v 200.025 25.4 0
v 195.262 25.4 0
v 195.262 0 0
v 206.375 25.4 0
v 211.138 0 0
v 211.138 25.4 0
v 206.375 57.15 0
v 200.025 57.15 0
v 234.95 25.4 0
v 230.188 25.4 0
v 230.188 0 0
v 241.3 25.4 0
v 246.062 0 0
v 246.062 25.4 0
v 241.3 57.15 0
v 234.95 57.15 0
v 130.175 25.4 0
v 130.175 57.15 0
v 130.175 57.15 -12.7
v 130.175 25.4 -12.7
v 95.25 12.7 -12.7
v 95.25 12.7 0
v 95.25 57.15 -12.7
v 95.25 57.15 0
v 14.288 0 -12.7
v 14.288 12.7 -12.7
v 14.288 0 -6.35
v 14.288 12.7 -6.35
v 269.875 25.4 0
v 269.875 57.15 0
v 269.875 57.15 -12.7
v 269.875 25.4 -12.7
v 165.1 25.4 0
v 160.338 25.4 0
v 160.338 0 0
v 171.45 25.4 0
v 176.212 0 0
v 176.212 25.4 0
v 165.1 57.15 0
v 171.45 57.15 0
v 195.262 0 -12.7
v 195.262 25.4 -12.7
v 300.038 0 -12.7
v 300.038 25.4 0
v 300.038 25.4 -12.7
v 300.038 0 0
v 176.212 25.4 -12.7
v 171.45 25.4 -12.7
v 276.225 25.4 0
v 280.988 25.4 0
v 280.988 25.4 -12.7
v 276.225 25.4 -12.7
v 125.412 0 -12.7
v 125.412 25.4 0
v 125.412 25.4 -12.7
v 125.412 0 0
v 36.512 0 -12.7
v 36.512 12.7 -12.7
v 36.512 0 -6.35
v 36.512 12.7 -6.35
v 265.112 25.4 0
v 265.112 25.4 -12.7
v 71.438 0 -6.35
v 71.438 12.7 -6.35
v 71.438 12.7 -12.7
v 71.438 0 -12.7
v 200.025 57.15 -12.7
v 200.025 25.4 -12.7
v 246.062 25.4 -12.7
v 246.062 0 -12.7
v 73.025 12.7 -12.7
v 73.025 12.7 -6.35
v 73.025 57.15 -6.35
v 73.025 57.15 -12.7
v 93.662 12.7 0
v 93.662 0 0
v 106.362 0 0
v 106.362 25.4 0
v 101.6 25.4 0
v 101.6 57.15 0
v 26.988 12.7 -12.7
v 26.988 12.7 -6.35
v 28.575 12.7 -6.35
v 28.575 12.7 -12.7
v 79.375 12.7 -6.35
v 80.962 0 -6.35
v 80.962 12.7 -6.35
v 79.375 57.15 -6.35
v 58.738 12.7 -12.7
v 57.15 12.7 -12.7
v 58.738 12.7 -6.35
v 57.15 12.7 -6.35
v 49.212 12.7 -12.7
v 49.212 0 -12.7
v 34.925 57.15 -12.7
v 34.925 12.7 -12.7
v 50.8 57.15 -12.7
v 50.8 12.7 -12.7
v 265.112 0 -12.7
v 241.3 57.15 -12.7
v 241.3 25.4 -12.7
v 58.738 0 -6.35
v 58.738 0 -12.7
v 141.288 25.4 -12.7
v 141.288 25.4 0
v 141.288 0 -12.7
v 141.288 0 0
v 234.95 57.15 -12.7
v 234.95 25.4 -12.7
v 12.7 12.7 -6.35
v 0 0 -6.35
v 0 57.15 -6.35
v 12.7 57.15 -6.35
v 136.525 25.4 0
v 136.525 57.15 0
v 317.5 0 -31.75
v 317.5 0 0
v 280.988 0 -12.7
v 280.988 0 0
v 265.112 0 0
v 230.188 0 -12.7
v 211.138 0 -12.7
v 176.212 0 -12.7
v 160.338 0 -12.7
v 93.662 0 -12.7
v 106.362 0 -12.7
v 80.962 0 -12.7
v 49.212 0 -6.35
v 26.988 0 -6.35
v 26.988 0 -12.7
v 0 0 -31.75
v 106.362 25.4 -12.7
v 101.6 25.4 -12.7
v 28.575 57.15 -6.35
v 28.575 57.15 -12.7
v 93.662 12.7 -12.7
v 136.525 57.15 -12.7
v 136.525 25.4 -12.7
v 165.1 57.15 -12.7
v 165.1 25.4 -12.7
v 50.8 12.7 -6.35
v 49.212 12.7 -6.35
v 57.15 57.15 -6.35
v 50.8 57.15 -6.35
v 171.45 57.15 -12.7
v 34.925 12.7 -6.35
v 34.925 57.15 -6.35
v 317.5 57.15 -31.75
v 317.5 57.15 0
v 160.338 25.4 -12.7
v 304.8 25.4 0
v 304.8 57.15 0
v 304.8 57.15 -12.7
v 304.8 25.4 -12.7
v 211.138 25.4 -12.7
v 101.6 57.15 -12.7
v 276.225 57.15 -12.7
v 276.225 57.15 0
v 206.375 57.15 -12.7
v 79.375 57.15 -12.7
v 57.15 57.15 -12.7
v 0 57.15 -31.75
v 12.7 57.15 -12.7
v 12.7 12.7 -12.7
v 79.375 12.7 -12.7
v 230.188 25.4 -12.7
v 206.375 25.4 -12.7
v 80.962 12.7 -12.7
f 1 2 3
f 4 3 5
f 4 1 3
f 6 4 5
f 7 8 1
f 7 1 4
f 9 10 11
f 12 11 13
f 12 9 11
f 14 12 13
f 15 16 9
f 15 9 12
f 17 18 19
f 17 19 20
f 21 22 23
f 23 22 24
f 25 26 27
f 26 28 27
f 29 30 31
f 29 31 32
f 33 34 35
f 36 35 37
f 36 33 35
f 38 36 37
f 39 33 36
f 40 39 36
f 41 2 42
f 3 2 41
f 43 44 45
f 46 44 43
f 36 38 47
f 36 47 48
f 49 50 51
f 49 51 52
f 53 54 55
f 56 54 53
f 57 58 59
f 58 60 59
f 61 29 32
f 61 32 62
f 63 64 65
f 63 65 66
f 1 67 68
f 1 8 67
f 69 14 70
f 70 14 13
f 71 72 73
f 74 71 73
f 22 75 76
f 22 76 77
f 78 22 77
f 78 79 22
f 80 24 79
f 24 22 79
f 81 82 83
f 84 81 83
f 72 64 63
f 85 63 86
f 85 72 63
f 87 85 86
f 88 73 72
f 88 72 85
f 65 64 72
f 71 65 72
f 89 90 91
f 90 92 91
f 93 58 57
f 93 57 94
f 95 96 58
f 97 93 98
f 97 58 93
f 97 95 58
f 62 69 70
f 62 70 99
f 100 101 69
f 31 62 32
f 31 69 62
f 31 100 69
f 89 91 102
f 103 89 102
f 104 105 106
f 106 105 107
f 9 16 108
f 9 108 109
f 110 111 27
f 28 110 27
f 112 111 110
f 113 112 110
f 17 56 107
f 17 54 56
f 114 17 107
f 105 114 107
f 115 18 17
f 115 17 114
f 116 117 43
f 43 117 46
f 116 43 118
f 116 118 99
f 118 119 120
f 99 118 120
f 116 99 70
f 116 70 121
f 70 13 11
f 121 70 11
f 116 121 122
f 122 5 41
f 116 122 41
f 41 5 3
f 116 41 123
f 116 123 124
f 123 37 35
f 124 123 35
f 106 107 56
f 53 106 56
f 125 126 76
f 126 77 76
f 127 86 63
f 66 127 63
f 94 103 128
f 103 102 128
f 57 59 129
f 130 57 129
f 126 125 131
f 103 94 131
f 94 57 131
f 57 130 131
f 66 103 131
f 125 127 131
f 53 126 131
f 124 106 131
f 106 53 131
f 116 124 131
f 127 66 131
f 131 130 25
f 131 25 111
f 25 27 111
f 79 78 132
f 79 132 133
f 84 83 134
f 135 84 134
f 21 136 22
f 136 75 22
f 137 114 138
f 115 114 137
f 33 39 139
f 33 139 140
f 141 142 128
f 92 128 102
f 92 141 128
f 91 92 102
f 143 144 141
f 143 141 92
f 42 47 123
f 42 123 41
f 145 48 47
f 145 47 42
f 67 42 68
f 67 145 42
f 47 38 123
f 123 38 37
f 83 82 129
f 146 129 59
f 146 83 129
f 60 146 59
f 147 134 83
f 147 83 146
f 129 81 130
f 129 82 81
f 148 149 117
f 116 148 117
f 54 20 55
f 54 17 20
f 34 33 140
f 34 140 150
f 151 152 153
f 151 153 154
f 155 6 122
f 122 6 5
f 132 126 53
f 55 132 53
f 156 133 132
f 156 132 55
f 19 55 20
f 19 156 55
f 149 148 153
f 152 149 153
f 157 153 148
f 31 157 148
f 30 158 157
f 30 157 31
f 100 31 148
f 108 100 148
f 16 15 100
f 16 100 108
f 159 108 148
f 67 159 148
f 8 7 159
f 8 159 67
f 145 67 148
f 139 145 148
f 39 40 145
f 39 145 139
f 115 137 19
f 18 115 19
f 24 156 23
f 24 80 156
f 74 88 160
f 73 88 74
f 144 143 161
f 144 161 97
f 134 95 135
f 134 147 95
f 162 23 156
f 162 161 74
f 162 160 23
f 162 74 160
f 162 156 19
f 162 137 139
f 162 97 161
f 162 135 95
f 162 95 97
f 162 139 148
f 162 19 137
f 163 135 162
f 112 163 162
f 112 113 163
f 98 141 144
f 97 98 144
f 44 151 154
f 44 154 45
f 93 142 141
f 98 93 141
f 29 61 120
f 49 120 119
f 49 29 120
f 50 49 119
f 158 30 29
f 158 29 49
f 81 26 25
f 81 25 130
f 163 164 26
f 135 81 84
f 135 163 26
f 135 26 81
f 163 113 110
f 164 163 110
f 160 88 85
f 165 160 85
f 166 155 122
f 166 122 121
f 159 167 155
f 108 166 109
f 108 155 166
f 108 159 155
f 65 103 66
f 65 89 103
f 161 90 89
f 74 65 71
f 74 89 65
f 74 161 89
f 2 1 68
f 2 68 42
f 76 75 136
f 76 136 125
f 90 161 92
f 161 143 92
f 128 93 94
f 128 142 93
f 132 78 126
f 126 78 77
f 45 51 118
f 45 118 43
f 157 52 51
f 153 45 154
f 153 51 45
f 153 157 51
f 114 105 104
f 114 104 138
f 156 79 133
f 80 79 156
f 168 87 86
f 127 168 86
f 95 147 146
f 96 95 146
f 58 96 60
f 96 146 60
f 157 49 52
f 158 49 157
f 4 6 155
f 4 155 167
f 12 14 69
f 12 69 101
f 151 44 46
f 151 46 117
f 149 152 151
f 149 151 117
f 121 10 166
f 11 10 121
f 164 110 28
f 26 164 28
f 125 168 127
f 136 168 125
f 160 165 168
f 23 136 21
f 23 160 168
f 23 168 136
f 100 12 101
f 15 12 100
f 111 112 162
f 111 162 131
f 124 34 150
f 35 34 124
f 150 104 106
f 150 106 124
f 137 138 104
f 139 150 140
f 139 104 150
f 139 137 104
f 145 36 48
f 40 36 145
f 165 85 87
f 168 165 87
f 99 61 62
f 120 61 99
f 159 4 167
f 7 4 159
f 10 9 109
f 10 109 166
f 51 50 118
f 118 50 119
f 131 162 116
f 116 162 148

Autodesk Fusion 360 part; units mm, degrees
sketch "Sketch1" plane through (0, 0, 0) normal (0, 0, 1) x (1, 0, 0)
  line L0 (0, 57.15) -> (0, 0)
  line L1 (101.6, 57.15) -> (130.175, 57.15)
  line L2 (130.175, 57.15) -> (130.175, 25.4)
  line L3 (130.175, 25.4) -> (101.6, 25.4)
  line L4 (101.6, 25.4) -> (101.6, 57.15)
  line L5 (115.8875, 25.4) -> (115.8875, 0) construction
  line L6 (106.3625, 25.4) -> (106.3625, 0)
  line L7 (125.4125, 25.4) -> (125.4125, 0)
  line L8 (12.7, 57.15) -> (12.7, 12.7)
  line L9 (12.7, 12.7) -> (28.575, 12.7)
  line L10 (28.575, 12.7) -> (28.575, 57.15)
  line L11 (14.2875, 12.7) -> (14.2875, 0)
  line L12 (26.9875, 12.7) -> (26.9875, 0)
  line L13 (12.7, 57.15) -> (28.575, 57.15)
  line L14 (14.2875, 0) -> (26.9875, 0)
  line L15 (106.3625, 0) -> (125.4125, 0)
  line L16 (36.5125, 0) -> (49.2125, 0)
  line L17 (34.925, 57.15) -> (50.8, 57.15)
  line L18 (49.2125, 12.7) -> (49.2125, 0)
  line L19 (34.925, 57.15) -> (34.925, 12.7)
  line L20 (36.5125, 12.7) -> (36.5125, 0)
  line L21 (34.925, 12.7) -> (50.8, 12.7)
  line L22 (50.8, 12.7) -> (50.8, 57.15)
  line L23 (58.7375, 0) -> (71.4375, 0)
  line L24 (57.15, 57.15) -> (73.025, 57.15)
  line L25 (71.4375, 12.7) -> (71.4375, 0)
  line L26 (57.15, 57.15) -> (57.15, 12.7)
  line L27 (58.7375, 12.7) -> (58.7375, 0)
  line L28 (57.15, 12.7) -> (73.025, 12.7)
  line L29 (73.025, 12.7) -> (73.025, 57.15)
  line L30 (80.9625, 0) -> (93.6625, 0)
  line L31 (79.375, 57.15) -> (95.25, 57.15)
  line L32 (93.6625, 12.7) -> (93.6625, 0)
  line L33 (79.375, 57.15) -> (79.375, 12.7)
  line L34 (80.9625, 12.7) -> (80.9625, 0)
  line L35 (79.375, 12.7) -> (95.25, 12.7)
  line L36 (95.25, 12.7) -> (95.25, 57.15)
  line L37 (141.2875, 25.4) -> (141.2875, 0)
  line L38 (136.525, 57.15) -> (165.1, 57.15)
  line L39 (150.8125, 25.4) -> (150.8125, 0) construction
  line L40 (136.525, 25.4) -> (136.525, 57.15)
  line L41 (165.1, 25.4) -> (136.525, 25.4)
  line L42 (165.1, 57.15) -> (165.1, 25.4)
  line L43 (160.3375, 25.4) -> (160.3375, 0)
  line L44 (141.2875, 0) -> (160.3375, 0)
  line L45 (176.2125, 25.4) -> (176.2125, 0)
  line L46 (171.45, 57.15) -> (200.025, 57.15)
  line L47 (185.7375, 25.4) -> (185.7375, 0) construction
  line L48 (171.45, 25.4) -> (171.45, 57.15)
  line L49 (200.025, 25.4) -> (171.45, 25.4)
  line L50 (200.025, 57.15) -> (200.025, 25.4)
  line L51 (195.2625, 25.4) -> (195.2625, 0)
  line L52 (176.2125, 0) -> (195.2625, 0)
  line L53 (211.1375, 25.4) -> (211.1375, 0)
  line L54 (206.375, 57.15) -> (234.95, 57.15)
  line L55 (220.6625, 25.4) -> (220.6625, 0) construction
  line L56 (206.375, 25.4) -> (206.375, 57.15)
  line L57 (234.95, 25.4) -> (206.375, 25.4)
  line L58 (234.95, 57.15) -> (234.95, 25.4)
  line L59 (230.1875, 25.4) -> (230.1875, 0)
  line L60 (211.1375, 0) -> (230.1875, 0)
  line L61 (317.5, 57.15) -> (317.5, 0)
  line L62 (317.5, 0) -> (0, 0)
  line L63 (317.5, 57.15) -> (0, 57.15)
  line L64 (265.1125, 25.4) -> (265.1125, 0)
  line L65 (241.3, 57.15) -> (269.875, 57.15)
  line L66 (255.5875, 25.4) -> (255.5875, 0) construction
  line L67 (246.0625, 25.4) -> (246.0625, 0)
  line L68 (269.875, 25.4) -> (241.3, 25.4)
  line L69 (246.0625, 0) -> (265.1125, 0)
  line L70 (269.875, 57.15) -> (269.875, 25.4)
  line L71 (241.3, 25.4) -> (241.3, 57.15)
  line L72 (300.0375, 25.4) -> (300.0375, 0)
  line L73 (276.225, 57.15) -> (304.8, 57.15)
  line L74 (290.5125, 25.4) -> (290.5125, 0) construction
  line L75 (280.9875, 25.4) -> (280.9875, 0)
  line L76 (304.8, 25.4) -> (276.225, 25.4)
  line L77 (280.9875, 0) -> (300.0375, 0)
  line L78 (304.8, 57.15) -> (304.8, 25.4)
  line L79 (276.225, 25.4) -> (276.225, 57.15)
  dimension "d2" = 57.15
  dimension "d4" = 28.575
  dimension "d6" = 9.525
  dimension "d7" = 9.525
  dimension "d21" = 15.875
  dimension "d23" = 12.7
  dimension "d24" = 1.5875
  dimension "d25" = 15.875
  dimension "d26" = 12.7
  dimension "d27" = 1.5875
  dimension "d28" = 15.875
  dimension "d29" = 12.7
  dimension "d30" = 1.5875
  dimension "d31" = 15.875
  dimension "d32" = 12.7
  dimension "d33" = 1.5875
  dimension "d34" = 6.35
  dimension "d35" = 6.35
  dimension "d36" = 6.35
  dimension "d37" = 12.7
  dimension "d38" = 6.35
  dimension "d39" = 31.75
  dimension "d40" = 28.575
  dimension "d41" = 9.525
  dimension "d42" = 9.525
  dimension "d43" = 31.75
  dimension "d44" = 28.575
  dimension "d45" = 9.525
  dimension "d46" = 9.525
  dimension "d47" = 31.75
  dimension "d48" = 28.575
  dimension "d49" = 9.525
  dimension "d50" = 9.525
  dimension "d51" = 31.75
  dimension "d52" = 6.35
  dimension "d53" = 6.35
  dimension "d54" = 6.35
  dimension "d56" = 28.575
  dimension "d57" = 9.525
  dimension "d58" = 9.525
  dimension "d59" = 31.75
  dimension "d60" = 28.575
  dimension "d61" = 9.525
  dimension "d62" = 9.525
  dimension "d63" = 31.75
  dimension "d64" = 6.35
  dimension "d65" = 6.35
  dimension "d66" = 12.7
extrude "Extrude3" add sketch "Sketch1" against normal blind 31.75
extrude "Extrude6" cut sketch "Sketch1" against normal blind 12.7 contours L1 L2 L3 L4 L63 | L3 L6 L7 L15 L62 | L38 L40 L41 L42 L63 | L37 L41 L43 L44 L62 | L46 L48 L49 L50 L63 | L45 L49 L51 L52 L62 | L54 L56 L57 L58 L63 | L53 L57 L59 L60 L62 | L63 L65 L68 L70 L71 | L62 L64 L67 L68 L69 | L63 L73 L76 L78 L79 | L62 L72 L75 L76 L77
extrude "Extrude7" cut sketch "Sketch1" against normal blind 12.7 contours L8 L9 L10 L13 L63 | L9 L11 L12 L14 L62 | L17 L19 L21 L22 L63 | L16 L18 L20 L21 L62 | L24 L26 L28 L29 L63 | L23 L25 L27 L28 L62 | L31 L33 L35 L36 L63 | L30 L32 L34 L35 L62
extrude "Extrude8" cut 4 faces at (77.2583, 4.2333, 0) (55.0333, 4.2333, 0) (32.8083, 4.2333, 0) (4.2333, 23.2833, 0) along direction (0, 0, -1) blind 6.35
equation "d21 = ( 5 / 8 ) * 1 in"
equation "d24 = ( 1 / 16 ) * 1 in"
equation "d25 = ( 5 / 8 ) * 1 in"
equation "d27 = ( 1 / 16 ) * 1 in"
equation "d28 = ( 5 / 8 ) * 1 in"
equation "d30 = ( 1 / 16 ) * 1 in"
equation "d31 = ( 5 / 8 ) * 1 in"
equation "d33 = ( 1 / 16 ) * 1 in"
